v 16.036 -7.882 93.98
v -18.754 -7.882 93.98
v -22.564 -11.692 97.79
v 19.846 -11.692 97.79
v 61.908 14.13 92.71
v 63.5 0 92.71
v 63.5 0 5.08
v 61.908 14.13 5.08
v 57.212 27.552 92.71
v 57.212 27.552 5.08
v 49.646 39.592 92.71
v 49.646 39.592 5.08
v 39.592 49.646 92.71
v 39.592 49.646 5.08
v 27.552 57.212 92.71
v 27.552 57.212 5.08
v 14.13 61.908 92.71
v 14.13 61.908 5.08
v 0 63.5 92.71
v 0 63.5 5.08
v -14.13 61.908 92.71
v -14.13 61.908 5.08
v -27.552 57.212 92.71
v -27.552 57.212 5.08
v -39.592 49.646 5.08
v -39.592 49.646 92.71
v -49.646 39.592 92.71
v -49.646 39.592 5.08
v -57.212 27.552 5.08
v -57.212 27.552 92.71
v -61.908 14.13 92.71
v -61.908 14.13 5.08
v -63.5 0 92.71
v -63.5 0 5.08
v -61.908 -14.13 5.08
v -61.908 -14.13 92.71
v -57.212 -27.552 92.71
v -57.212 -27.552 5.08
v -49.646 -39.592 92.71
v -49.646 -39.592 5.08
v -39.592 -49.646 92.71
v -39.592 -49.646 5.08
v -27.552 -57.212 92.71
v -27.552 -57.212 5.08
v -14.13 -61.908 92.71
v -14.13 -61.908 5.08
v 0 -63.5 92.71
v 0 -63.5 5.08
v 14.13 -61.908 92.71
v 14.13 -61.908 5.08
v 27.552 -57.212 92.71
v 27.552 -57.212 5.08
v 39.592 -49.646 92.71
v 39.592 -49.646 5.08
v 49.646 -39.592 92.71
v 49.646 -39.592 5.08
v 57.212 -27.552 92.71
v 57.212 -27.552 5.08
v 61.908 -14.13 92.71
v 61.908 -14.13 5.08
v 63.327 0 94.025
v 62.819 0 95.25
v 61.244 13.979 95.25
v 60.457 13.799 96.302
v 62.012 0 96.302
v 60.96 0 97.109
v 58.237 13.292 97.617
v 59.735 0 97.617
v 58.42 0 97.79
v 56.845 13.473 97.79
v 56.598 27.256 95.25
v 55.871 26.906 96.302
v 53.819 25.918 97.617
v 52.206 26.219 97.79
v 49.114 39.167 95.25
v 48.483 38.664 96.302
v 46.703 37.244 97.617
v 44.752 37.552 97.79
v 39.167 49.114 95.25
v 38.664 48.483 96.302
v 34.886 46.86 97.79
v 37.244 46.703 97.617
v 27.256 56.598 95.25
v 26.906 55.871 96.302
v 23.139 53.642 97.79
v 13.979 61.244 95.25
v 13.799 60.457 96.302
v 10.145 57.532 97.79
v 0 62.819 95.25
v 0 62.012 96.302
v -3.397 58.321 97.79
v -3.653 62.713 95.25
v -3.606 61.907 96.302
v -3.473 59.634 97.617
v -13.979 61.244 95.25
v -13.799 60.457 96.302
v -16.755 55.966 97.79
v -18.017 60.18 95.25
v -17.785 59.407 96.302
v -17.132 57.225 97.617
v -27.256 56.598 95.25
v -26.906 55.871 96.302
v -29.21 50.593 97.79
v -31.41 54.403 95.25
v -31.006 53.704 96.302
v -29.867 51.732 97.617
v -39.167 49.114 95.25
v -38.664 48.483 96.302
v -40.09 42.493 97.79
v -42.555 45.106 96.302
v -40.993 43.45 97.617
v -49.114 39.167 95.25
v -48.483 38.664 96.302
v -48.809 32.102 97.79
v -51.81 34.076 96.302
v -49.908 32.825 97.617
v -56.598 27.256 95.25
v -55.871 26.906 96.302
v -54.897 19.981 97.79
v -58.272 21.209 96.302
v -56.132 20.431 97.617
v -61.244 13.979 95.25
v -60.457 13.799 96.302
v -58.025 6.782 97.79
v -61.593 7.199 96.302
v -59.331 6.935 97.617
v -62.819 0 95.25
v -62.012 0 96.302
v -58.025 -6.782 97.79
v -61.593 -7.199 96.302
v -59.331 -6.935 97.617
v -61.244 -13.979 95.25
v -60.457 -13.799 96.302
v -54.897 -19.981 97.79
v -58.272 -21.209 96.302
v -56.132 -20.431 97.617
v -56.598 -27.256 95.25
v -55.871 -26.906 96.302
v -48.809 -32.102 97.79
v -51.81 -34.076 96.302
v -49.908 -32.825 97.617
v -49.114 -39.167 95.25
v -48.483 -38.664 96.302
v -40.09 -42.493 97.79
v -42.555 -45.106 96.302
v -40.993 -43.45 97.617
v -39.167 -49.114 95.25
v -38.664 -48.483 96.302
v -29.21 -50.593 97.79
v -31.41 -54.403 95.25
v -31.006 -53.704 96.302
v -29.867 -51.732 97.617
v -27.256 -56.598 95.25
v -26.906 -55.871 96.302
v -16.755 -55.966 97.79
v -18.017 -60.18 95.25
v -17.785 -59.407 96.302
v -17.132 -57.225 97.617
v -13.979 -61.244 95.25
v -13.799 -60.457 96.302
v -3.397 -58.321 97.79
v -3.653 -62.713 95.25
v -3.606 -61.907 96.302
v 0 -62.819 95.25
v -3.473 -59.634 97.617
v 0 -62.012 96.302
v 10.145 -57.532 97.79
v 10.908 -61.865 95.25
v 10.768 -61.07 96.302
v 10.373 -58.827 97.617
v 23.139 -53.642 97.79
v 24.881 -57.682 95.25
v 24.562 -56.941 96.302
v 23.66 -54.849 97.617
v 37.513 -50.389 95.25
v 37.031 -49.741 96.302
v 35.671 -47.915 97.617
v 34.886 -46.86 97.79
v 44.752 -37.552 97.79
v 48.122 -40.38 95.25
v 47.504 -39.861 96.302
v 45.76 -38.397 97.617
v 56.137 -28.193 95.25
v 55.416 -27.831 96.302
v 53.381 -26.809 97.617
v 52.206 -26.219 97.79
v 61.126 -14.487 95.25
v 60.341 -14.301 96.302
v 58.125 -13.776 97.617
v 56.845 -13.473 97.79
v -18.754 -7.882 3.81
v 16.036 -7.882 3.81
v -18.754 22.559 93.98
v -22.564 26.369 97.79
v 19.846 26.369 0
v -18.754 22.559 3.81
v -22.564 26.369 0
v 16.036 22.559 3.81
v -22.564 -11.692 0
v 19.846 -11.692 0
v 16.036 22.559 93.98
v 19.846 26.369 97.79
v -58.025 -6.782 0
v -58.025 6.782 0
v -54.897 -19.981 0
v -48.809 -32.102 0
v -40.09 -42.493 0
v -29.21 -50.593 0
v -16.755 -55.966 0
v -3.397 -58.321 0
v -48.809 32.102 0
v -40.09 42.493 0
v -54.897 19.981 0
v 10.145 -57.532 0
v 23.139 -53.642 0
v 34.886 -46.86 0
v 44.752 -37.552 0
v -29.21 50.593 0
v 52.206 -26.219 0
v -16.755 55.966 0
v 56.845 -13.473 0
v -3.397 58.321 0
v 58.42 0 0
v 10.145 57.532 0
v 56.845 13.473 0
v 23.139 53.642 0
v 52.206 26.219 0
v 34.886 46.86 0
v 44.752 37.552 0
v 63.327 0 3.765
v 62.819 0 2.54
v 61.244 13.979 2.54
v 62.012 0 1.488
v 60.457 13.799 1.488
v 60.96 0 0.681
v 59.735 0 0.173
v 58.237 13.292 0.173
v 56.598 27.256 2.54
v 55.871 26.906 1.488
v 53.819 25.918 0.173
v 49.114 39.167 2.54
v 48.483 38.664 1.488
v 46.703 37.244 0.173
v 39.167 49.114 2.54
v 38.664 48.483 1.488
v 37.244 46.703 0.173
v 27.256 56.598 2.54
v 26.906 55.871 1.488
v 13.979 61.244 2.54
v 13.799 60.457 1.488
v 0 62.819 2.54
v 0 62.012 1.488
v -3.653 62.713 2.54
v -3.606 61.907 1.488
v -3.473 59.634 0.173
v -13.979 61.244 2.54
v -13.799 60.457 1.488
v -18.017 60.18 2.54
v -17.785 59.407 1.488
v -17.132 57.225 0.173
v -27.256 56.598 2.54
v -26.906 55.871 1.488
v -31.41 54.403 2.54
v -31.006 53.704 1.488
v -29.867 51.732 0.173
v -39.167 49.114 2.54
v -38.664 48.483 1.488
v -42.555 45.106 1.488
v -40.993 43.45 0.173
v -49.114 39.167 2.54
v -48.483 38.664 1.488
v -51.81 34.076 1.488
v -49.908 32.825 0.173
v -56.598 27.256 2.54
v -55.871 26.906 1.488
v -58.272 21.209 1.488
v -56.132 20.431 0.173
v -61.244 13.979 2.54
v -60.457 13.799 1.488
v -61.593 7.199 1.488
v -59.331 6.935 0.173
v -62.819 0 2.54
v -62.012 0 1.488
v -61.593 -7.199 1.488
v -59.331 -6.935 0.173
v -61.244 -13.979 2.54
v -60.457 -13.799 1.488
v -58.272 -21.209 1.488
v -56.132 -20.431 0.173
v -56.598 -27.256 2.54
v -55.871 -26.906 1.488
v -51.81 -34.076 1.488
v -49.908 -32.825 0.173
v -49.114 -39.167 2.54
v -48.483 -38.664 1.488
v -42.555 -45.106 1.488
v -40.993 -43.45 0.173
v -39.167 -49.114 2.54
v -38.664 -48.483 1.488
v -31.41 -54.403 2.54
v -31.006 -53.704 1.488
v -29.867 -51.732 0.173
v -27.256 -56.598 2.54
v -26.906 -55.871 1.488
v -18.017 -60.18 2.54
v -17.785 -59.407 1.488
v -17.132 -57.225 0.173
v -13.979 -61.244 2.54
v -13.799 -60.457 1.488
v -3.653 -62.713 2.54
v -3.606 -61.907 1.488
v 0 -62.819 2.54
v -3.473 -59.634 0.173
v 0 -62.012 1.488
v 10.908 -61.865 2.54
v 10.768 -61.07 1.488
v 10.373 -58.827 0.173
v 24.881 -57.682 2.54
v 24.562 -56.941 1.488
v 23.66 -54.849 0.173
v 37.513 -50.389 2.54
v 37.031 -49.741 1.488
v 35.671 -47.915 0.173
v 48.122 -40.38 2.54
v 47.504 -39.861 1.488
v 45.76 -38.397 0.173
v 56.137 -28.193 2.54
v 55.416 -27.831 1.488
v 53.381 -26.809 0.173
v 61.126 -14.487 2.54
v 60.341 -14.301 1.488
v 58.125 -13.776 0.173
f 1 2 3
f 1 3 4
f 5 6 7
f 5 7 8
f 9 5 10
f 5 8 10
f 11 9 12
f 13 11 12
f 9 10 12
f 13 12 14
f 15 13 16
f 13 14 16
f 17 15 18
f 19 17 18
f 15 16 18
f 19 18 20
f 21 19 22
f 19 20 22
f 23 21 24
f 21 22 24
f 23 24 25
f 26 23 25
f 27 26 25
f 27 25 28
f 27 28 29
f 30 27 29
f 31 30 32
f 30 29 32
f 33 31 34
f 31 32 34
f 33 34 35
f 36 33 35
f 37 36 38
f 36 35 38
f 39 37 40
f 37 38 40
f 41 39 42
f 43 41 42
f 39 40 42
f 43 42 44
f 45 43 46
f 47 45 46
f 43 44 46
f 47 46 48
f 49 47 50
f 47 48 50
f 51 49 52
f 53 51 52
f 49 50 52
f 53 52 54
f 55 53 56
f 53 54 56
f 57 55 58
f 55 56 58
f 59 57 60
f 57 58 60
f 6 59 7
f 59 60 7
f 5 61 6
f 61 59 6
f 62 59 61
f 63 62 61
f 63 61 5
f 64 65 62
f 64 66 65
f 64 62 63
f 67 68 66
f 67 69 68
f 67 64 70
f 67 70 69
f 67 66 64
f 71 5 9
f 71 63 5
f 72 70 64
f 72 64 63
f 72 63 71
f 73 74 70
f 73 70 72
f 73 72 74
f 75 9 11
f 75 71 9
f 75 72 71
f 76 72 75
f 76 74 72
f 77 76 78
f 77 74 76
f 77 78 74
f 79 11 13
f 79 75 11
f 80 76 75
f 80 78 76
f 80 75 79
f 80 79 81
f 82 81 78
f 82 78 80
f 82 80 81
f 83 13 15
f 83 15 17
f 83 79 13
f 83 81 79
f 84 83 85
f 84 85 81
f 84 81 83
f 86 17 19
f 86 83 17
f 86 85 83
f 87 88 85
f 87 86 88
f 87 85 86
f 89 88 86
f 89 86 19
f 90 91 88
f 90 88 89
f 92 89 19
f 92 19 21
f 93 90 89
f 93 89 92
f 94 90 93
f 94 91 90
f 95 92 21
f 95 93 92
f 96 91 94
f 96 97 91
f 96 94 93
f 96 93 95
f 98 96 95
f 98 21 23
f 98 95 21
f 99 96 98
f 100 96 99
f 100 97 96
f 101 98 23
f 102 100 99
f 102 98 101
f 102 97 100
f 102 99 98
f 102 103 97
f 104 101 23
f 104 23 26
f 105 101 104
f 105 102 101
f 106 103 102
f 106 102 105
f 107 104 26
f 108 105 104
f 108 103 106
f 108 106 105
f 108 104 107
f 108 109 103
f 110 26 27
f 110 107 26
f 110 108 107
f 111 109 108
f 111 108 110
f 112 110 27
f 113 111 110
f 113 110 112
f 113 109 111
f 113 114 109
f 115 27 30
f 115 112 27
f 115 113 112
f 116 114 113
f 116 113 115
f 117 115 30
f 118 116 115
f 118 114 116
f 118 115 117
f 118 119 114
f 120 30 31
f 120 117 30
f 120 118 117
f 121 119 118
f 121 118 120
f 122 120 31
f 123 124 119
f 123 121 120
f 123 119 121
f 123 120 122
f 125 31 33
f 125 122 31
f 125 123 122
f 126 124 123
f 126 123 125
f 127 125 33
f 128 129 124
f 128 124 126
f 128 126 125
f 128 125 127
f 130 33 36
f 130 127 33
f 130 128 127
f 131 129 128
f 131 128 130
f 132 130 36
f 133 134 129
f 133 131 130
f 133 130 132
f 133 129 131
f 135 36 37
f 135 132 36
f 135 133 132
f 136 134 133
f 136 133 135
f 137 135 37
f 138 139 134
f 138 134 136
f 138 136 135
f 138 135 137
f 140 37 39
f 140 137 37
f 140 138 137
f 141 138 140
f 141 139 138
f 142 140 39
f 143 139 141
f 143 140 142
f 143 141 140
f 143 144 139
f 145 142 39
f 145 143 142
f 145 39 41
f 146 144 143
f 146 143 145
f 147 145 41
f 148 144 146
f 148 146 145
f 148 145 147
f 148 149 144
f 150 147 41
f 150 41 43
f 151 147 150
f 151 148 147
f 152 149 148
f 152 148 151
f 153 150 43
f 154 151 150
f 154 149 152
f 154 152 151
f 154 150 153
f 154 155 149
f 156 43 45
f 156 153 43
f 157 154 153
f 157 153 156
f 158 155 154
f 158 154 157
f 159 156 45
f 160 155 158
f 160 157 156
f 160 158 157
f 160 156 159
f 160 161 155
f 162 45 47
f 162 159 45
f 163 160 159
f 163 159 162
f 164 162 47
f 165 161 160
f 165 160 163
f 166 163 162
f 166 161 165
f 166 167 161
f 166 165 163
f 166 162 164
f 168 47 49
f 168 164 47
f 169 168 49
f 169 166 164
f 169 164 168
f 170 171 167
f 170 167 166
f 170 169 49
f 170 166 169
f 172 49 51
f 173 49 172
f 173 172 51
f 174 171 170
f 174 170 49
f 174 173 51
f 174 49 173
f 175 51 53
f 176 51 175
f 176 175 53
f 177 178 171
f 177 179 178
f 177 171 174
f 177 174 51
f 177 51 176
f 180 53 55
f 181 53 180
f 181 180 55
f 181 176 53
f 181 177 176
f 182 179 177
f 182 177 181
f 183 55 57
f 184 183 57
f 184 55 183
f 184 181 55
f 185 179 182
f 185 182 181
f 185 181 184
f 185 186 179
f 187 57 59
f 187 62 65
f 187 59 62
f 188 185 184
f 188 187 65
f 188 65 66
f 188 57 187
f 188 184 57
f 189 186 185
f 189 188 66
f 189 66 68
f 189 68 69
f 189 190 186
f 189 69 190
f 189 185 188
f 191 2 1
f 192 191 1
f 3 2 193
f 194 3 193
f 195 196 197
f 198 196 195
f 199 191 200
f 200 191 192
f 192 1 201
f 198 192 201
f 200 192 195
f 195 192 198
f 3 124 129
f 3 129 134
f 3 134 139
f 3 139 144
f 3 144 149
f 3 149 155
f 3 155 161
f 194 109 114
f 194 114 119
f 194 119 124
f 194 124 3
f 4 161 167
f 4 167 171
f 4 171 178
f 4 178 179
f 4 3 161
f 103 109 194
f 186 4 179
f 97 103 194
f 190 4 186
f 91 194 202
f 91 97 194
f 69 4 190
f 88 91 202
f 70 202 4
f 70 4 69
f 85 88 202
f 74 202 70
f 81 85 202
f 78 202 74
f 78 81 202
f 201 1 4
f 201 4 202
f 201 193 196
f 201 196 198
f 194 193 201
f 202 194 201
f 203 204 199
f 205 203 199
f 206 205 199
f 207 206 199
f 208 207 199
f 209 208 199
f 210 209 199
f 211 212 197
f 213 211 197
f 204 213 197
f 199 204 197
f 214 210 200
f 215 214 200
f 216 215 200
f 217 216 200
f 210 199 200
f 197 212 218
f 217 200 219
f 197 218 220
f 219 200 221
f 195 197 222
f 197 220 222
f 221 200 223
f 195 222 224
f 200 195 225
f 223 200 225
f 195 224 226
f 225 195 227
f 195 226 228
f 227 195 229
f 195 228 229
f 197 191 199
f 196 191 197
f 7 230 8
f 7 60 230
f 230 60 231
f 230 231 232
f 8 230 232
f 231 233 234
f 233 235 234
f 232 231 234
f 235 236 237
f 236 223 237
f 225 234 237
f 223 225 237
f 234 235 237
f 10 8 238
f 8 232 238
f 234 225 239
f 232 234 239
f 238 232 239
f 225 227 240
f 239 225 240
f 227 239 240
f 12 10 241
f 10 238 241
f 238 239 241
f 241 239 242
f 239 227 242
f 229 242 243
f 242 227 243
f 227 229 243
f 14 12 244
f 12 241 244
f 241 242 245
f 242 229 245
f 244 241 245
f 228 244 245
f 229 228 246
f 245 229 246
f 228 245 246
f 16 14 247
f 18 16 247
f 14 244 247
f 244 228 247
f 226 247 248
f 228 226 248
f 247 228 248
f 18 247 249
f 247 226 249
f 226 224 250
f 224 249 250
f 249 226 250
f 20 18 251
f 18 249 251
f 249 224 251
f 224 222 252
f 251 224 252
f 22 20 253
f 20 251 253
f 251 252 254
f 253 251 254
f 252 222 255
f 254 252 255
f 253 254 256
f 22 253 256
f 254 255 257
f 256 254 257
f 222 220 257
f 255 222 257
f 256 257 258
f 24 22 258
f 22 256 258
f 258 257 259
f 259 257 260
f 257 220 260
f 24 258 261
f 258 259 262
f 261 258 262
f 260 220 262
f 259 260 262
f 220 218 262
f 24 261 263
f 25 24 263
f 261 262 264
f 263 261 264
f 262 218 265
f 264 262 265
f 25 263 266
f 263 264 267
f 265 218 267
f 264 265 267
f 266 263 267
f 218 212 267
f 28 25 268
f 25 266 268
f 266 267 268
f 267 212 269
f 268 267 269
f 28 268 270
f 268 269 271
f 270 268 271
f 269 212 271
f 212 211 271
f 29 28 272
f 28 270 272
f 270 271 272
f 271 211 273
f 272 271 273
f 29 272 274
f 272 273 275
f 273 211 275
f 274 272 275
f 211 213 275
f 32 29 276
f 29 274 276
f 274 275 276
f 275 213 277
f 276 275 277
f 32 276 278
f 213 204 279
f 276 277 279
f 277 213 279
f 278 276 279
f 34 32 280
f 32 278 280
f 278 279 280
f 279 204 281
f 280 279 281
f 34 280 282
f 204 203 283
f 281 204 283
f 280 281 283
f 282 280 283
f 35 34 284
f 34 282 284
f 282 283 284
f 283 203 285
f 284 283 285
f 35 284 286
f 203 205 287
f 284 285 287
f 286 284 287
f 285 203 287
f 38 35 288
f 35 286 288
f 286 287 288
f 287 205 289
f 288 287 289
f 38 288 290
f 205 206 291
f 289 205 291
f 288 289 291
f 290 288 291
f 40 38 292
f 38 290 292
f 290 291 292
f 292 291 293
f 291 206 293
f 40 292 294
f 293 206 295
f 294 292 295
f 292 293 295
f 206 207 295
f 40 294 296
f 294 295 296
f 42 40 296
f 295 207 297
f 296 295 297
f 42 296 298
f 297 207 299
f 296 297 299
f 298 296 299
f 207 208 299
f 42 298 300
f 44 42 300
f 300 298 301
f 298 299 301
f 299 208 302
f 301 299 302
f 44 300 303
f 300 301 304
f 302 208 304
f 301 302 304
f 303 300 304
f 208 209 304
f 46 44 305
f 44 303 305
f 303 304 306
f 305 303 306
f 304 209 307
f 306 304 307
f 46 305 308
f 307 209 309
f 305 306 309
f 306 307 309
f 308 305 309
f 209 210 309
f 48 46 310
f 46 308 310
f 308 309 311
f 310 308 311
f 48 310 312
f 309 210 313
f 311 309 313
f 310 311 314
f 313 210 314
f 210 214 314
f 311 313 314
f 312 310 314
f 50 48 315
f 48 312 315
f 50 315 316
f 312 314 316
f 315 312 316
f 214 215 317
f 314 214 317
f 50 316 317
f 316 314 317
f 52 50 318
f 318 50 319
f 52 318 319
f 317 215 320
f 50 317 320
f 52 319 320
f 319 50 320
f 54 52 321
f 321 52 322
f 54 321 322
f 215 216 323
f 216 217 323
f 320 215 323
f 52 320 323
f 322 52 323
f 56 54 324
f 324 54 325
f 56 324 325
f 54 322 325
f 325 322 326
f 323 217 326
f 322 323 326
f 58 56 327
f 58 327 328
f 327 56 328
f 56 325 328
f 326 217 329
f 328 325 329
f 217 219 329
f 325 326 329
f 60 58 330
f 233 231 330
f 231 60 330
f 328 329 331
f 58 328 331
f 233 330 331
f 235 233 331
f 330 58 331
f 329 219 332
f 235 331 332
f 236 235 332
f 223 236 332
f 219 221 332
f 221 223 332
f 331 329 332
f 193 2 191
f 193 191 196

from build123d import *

# Parameters (mm, degrees)
F0_R     = 63.5
F1_DEPTH = 97.79
F2_W     = 34.789767
F2_H     = 30.441041
F3_DEPTH = 97.791
F4_R     = 5.08
F5_SIZE  = 3.81


with BuildPart() as f1:
    # F0 (on Top) → F1 (new body)
    with BuildSketch(Plane.XY):
        Circle(F0_R)
    extrude(amount=F1_DEPTH)

    # F2 (on face) → F3 (cut, through all)
    with BuildSketch(Plane.XY.offset(97.79)):
        with Locations((-1.358978, 7.338465)):
            Rectangle(F2_W, F2_H)
    extrude(amount=-F3_DEPTH, mode=Mode.SUBTRACT)

    # F4
    f4_edges = [f1.edges().sort_by_distance(p)[0] for p in [
        (-63.5, 0, 97.79),
        (-63.5, 0, 0),
    ]]
    fillet(f4_edges, radius=F4_R)

    # F5
    f5_edges = [f1.edges().sort_by_distance(p)[0] for p in [
        (-1.358978, -7.882056, 0),
        (16.035905, 7.338465, 0),
        (-1.358978, 22.558985, 0),
        (-18.753862, 7.338465, 0),
        (16.035905, 7.338465, 97.79),
        (-1.358978, 22.558985, 97.79),
        (-18.753862, 7.338465, 97.79),
        (-1.358978, -7.882056, 97.79),
    ]]
    chamfer(f5_edges, length=F5_SIZE)


solid = f1.part
